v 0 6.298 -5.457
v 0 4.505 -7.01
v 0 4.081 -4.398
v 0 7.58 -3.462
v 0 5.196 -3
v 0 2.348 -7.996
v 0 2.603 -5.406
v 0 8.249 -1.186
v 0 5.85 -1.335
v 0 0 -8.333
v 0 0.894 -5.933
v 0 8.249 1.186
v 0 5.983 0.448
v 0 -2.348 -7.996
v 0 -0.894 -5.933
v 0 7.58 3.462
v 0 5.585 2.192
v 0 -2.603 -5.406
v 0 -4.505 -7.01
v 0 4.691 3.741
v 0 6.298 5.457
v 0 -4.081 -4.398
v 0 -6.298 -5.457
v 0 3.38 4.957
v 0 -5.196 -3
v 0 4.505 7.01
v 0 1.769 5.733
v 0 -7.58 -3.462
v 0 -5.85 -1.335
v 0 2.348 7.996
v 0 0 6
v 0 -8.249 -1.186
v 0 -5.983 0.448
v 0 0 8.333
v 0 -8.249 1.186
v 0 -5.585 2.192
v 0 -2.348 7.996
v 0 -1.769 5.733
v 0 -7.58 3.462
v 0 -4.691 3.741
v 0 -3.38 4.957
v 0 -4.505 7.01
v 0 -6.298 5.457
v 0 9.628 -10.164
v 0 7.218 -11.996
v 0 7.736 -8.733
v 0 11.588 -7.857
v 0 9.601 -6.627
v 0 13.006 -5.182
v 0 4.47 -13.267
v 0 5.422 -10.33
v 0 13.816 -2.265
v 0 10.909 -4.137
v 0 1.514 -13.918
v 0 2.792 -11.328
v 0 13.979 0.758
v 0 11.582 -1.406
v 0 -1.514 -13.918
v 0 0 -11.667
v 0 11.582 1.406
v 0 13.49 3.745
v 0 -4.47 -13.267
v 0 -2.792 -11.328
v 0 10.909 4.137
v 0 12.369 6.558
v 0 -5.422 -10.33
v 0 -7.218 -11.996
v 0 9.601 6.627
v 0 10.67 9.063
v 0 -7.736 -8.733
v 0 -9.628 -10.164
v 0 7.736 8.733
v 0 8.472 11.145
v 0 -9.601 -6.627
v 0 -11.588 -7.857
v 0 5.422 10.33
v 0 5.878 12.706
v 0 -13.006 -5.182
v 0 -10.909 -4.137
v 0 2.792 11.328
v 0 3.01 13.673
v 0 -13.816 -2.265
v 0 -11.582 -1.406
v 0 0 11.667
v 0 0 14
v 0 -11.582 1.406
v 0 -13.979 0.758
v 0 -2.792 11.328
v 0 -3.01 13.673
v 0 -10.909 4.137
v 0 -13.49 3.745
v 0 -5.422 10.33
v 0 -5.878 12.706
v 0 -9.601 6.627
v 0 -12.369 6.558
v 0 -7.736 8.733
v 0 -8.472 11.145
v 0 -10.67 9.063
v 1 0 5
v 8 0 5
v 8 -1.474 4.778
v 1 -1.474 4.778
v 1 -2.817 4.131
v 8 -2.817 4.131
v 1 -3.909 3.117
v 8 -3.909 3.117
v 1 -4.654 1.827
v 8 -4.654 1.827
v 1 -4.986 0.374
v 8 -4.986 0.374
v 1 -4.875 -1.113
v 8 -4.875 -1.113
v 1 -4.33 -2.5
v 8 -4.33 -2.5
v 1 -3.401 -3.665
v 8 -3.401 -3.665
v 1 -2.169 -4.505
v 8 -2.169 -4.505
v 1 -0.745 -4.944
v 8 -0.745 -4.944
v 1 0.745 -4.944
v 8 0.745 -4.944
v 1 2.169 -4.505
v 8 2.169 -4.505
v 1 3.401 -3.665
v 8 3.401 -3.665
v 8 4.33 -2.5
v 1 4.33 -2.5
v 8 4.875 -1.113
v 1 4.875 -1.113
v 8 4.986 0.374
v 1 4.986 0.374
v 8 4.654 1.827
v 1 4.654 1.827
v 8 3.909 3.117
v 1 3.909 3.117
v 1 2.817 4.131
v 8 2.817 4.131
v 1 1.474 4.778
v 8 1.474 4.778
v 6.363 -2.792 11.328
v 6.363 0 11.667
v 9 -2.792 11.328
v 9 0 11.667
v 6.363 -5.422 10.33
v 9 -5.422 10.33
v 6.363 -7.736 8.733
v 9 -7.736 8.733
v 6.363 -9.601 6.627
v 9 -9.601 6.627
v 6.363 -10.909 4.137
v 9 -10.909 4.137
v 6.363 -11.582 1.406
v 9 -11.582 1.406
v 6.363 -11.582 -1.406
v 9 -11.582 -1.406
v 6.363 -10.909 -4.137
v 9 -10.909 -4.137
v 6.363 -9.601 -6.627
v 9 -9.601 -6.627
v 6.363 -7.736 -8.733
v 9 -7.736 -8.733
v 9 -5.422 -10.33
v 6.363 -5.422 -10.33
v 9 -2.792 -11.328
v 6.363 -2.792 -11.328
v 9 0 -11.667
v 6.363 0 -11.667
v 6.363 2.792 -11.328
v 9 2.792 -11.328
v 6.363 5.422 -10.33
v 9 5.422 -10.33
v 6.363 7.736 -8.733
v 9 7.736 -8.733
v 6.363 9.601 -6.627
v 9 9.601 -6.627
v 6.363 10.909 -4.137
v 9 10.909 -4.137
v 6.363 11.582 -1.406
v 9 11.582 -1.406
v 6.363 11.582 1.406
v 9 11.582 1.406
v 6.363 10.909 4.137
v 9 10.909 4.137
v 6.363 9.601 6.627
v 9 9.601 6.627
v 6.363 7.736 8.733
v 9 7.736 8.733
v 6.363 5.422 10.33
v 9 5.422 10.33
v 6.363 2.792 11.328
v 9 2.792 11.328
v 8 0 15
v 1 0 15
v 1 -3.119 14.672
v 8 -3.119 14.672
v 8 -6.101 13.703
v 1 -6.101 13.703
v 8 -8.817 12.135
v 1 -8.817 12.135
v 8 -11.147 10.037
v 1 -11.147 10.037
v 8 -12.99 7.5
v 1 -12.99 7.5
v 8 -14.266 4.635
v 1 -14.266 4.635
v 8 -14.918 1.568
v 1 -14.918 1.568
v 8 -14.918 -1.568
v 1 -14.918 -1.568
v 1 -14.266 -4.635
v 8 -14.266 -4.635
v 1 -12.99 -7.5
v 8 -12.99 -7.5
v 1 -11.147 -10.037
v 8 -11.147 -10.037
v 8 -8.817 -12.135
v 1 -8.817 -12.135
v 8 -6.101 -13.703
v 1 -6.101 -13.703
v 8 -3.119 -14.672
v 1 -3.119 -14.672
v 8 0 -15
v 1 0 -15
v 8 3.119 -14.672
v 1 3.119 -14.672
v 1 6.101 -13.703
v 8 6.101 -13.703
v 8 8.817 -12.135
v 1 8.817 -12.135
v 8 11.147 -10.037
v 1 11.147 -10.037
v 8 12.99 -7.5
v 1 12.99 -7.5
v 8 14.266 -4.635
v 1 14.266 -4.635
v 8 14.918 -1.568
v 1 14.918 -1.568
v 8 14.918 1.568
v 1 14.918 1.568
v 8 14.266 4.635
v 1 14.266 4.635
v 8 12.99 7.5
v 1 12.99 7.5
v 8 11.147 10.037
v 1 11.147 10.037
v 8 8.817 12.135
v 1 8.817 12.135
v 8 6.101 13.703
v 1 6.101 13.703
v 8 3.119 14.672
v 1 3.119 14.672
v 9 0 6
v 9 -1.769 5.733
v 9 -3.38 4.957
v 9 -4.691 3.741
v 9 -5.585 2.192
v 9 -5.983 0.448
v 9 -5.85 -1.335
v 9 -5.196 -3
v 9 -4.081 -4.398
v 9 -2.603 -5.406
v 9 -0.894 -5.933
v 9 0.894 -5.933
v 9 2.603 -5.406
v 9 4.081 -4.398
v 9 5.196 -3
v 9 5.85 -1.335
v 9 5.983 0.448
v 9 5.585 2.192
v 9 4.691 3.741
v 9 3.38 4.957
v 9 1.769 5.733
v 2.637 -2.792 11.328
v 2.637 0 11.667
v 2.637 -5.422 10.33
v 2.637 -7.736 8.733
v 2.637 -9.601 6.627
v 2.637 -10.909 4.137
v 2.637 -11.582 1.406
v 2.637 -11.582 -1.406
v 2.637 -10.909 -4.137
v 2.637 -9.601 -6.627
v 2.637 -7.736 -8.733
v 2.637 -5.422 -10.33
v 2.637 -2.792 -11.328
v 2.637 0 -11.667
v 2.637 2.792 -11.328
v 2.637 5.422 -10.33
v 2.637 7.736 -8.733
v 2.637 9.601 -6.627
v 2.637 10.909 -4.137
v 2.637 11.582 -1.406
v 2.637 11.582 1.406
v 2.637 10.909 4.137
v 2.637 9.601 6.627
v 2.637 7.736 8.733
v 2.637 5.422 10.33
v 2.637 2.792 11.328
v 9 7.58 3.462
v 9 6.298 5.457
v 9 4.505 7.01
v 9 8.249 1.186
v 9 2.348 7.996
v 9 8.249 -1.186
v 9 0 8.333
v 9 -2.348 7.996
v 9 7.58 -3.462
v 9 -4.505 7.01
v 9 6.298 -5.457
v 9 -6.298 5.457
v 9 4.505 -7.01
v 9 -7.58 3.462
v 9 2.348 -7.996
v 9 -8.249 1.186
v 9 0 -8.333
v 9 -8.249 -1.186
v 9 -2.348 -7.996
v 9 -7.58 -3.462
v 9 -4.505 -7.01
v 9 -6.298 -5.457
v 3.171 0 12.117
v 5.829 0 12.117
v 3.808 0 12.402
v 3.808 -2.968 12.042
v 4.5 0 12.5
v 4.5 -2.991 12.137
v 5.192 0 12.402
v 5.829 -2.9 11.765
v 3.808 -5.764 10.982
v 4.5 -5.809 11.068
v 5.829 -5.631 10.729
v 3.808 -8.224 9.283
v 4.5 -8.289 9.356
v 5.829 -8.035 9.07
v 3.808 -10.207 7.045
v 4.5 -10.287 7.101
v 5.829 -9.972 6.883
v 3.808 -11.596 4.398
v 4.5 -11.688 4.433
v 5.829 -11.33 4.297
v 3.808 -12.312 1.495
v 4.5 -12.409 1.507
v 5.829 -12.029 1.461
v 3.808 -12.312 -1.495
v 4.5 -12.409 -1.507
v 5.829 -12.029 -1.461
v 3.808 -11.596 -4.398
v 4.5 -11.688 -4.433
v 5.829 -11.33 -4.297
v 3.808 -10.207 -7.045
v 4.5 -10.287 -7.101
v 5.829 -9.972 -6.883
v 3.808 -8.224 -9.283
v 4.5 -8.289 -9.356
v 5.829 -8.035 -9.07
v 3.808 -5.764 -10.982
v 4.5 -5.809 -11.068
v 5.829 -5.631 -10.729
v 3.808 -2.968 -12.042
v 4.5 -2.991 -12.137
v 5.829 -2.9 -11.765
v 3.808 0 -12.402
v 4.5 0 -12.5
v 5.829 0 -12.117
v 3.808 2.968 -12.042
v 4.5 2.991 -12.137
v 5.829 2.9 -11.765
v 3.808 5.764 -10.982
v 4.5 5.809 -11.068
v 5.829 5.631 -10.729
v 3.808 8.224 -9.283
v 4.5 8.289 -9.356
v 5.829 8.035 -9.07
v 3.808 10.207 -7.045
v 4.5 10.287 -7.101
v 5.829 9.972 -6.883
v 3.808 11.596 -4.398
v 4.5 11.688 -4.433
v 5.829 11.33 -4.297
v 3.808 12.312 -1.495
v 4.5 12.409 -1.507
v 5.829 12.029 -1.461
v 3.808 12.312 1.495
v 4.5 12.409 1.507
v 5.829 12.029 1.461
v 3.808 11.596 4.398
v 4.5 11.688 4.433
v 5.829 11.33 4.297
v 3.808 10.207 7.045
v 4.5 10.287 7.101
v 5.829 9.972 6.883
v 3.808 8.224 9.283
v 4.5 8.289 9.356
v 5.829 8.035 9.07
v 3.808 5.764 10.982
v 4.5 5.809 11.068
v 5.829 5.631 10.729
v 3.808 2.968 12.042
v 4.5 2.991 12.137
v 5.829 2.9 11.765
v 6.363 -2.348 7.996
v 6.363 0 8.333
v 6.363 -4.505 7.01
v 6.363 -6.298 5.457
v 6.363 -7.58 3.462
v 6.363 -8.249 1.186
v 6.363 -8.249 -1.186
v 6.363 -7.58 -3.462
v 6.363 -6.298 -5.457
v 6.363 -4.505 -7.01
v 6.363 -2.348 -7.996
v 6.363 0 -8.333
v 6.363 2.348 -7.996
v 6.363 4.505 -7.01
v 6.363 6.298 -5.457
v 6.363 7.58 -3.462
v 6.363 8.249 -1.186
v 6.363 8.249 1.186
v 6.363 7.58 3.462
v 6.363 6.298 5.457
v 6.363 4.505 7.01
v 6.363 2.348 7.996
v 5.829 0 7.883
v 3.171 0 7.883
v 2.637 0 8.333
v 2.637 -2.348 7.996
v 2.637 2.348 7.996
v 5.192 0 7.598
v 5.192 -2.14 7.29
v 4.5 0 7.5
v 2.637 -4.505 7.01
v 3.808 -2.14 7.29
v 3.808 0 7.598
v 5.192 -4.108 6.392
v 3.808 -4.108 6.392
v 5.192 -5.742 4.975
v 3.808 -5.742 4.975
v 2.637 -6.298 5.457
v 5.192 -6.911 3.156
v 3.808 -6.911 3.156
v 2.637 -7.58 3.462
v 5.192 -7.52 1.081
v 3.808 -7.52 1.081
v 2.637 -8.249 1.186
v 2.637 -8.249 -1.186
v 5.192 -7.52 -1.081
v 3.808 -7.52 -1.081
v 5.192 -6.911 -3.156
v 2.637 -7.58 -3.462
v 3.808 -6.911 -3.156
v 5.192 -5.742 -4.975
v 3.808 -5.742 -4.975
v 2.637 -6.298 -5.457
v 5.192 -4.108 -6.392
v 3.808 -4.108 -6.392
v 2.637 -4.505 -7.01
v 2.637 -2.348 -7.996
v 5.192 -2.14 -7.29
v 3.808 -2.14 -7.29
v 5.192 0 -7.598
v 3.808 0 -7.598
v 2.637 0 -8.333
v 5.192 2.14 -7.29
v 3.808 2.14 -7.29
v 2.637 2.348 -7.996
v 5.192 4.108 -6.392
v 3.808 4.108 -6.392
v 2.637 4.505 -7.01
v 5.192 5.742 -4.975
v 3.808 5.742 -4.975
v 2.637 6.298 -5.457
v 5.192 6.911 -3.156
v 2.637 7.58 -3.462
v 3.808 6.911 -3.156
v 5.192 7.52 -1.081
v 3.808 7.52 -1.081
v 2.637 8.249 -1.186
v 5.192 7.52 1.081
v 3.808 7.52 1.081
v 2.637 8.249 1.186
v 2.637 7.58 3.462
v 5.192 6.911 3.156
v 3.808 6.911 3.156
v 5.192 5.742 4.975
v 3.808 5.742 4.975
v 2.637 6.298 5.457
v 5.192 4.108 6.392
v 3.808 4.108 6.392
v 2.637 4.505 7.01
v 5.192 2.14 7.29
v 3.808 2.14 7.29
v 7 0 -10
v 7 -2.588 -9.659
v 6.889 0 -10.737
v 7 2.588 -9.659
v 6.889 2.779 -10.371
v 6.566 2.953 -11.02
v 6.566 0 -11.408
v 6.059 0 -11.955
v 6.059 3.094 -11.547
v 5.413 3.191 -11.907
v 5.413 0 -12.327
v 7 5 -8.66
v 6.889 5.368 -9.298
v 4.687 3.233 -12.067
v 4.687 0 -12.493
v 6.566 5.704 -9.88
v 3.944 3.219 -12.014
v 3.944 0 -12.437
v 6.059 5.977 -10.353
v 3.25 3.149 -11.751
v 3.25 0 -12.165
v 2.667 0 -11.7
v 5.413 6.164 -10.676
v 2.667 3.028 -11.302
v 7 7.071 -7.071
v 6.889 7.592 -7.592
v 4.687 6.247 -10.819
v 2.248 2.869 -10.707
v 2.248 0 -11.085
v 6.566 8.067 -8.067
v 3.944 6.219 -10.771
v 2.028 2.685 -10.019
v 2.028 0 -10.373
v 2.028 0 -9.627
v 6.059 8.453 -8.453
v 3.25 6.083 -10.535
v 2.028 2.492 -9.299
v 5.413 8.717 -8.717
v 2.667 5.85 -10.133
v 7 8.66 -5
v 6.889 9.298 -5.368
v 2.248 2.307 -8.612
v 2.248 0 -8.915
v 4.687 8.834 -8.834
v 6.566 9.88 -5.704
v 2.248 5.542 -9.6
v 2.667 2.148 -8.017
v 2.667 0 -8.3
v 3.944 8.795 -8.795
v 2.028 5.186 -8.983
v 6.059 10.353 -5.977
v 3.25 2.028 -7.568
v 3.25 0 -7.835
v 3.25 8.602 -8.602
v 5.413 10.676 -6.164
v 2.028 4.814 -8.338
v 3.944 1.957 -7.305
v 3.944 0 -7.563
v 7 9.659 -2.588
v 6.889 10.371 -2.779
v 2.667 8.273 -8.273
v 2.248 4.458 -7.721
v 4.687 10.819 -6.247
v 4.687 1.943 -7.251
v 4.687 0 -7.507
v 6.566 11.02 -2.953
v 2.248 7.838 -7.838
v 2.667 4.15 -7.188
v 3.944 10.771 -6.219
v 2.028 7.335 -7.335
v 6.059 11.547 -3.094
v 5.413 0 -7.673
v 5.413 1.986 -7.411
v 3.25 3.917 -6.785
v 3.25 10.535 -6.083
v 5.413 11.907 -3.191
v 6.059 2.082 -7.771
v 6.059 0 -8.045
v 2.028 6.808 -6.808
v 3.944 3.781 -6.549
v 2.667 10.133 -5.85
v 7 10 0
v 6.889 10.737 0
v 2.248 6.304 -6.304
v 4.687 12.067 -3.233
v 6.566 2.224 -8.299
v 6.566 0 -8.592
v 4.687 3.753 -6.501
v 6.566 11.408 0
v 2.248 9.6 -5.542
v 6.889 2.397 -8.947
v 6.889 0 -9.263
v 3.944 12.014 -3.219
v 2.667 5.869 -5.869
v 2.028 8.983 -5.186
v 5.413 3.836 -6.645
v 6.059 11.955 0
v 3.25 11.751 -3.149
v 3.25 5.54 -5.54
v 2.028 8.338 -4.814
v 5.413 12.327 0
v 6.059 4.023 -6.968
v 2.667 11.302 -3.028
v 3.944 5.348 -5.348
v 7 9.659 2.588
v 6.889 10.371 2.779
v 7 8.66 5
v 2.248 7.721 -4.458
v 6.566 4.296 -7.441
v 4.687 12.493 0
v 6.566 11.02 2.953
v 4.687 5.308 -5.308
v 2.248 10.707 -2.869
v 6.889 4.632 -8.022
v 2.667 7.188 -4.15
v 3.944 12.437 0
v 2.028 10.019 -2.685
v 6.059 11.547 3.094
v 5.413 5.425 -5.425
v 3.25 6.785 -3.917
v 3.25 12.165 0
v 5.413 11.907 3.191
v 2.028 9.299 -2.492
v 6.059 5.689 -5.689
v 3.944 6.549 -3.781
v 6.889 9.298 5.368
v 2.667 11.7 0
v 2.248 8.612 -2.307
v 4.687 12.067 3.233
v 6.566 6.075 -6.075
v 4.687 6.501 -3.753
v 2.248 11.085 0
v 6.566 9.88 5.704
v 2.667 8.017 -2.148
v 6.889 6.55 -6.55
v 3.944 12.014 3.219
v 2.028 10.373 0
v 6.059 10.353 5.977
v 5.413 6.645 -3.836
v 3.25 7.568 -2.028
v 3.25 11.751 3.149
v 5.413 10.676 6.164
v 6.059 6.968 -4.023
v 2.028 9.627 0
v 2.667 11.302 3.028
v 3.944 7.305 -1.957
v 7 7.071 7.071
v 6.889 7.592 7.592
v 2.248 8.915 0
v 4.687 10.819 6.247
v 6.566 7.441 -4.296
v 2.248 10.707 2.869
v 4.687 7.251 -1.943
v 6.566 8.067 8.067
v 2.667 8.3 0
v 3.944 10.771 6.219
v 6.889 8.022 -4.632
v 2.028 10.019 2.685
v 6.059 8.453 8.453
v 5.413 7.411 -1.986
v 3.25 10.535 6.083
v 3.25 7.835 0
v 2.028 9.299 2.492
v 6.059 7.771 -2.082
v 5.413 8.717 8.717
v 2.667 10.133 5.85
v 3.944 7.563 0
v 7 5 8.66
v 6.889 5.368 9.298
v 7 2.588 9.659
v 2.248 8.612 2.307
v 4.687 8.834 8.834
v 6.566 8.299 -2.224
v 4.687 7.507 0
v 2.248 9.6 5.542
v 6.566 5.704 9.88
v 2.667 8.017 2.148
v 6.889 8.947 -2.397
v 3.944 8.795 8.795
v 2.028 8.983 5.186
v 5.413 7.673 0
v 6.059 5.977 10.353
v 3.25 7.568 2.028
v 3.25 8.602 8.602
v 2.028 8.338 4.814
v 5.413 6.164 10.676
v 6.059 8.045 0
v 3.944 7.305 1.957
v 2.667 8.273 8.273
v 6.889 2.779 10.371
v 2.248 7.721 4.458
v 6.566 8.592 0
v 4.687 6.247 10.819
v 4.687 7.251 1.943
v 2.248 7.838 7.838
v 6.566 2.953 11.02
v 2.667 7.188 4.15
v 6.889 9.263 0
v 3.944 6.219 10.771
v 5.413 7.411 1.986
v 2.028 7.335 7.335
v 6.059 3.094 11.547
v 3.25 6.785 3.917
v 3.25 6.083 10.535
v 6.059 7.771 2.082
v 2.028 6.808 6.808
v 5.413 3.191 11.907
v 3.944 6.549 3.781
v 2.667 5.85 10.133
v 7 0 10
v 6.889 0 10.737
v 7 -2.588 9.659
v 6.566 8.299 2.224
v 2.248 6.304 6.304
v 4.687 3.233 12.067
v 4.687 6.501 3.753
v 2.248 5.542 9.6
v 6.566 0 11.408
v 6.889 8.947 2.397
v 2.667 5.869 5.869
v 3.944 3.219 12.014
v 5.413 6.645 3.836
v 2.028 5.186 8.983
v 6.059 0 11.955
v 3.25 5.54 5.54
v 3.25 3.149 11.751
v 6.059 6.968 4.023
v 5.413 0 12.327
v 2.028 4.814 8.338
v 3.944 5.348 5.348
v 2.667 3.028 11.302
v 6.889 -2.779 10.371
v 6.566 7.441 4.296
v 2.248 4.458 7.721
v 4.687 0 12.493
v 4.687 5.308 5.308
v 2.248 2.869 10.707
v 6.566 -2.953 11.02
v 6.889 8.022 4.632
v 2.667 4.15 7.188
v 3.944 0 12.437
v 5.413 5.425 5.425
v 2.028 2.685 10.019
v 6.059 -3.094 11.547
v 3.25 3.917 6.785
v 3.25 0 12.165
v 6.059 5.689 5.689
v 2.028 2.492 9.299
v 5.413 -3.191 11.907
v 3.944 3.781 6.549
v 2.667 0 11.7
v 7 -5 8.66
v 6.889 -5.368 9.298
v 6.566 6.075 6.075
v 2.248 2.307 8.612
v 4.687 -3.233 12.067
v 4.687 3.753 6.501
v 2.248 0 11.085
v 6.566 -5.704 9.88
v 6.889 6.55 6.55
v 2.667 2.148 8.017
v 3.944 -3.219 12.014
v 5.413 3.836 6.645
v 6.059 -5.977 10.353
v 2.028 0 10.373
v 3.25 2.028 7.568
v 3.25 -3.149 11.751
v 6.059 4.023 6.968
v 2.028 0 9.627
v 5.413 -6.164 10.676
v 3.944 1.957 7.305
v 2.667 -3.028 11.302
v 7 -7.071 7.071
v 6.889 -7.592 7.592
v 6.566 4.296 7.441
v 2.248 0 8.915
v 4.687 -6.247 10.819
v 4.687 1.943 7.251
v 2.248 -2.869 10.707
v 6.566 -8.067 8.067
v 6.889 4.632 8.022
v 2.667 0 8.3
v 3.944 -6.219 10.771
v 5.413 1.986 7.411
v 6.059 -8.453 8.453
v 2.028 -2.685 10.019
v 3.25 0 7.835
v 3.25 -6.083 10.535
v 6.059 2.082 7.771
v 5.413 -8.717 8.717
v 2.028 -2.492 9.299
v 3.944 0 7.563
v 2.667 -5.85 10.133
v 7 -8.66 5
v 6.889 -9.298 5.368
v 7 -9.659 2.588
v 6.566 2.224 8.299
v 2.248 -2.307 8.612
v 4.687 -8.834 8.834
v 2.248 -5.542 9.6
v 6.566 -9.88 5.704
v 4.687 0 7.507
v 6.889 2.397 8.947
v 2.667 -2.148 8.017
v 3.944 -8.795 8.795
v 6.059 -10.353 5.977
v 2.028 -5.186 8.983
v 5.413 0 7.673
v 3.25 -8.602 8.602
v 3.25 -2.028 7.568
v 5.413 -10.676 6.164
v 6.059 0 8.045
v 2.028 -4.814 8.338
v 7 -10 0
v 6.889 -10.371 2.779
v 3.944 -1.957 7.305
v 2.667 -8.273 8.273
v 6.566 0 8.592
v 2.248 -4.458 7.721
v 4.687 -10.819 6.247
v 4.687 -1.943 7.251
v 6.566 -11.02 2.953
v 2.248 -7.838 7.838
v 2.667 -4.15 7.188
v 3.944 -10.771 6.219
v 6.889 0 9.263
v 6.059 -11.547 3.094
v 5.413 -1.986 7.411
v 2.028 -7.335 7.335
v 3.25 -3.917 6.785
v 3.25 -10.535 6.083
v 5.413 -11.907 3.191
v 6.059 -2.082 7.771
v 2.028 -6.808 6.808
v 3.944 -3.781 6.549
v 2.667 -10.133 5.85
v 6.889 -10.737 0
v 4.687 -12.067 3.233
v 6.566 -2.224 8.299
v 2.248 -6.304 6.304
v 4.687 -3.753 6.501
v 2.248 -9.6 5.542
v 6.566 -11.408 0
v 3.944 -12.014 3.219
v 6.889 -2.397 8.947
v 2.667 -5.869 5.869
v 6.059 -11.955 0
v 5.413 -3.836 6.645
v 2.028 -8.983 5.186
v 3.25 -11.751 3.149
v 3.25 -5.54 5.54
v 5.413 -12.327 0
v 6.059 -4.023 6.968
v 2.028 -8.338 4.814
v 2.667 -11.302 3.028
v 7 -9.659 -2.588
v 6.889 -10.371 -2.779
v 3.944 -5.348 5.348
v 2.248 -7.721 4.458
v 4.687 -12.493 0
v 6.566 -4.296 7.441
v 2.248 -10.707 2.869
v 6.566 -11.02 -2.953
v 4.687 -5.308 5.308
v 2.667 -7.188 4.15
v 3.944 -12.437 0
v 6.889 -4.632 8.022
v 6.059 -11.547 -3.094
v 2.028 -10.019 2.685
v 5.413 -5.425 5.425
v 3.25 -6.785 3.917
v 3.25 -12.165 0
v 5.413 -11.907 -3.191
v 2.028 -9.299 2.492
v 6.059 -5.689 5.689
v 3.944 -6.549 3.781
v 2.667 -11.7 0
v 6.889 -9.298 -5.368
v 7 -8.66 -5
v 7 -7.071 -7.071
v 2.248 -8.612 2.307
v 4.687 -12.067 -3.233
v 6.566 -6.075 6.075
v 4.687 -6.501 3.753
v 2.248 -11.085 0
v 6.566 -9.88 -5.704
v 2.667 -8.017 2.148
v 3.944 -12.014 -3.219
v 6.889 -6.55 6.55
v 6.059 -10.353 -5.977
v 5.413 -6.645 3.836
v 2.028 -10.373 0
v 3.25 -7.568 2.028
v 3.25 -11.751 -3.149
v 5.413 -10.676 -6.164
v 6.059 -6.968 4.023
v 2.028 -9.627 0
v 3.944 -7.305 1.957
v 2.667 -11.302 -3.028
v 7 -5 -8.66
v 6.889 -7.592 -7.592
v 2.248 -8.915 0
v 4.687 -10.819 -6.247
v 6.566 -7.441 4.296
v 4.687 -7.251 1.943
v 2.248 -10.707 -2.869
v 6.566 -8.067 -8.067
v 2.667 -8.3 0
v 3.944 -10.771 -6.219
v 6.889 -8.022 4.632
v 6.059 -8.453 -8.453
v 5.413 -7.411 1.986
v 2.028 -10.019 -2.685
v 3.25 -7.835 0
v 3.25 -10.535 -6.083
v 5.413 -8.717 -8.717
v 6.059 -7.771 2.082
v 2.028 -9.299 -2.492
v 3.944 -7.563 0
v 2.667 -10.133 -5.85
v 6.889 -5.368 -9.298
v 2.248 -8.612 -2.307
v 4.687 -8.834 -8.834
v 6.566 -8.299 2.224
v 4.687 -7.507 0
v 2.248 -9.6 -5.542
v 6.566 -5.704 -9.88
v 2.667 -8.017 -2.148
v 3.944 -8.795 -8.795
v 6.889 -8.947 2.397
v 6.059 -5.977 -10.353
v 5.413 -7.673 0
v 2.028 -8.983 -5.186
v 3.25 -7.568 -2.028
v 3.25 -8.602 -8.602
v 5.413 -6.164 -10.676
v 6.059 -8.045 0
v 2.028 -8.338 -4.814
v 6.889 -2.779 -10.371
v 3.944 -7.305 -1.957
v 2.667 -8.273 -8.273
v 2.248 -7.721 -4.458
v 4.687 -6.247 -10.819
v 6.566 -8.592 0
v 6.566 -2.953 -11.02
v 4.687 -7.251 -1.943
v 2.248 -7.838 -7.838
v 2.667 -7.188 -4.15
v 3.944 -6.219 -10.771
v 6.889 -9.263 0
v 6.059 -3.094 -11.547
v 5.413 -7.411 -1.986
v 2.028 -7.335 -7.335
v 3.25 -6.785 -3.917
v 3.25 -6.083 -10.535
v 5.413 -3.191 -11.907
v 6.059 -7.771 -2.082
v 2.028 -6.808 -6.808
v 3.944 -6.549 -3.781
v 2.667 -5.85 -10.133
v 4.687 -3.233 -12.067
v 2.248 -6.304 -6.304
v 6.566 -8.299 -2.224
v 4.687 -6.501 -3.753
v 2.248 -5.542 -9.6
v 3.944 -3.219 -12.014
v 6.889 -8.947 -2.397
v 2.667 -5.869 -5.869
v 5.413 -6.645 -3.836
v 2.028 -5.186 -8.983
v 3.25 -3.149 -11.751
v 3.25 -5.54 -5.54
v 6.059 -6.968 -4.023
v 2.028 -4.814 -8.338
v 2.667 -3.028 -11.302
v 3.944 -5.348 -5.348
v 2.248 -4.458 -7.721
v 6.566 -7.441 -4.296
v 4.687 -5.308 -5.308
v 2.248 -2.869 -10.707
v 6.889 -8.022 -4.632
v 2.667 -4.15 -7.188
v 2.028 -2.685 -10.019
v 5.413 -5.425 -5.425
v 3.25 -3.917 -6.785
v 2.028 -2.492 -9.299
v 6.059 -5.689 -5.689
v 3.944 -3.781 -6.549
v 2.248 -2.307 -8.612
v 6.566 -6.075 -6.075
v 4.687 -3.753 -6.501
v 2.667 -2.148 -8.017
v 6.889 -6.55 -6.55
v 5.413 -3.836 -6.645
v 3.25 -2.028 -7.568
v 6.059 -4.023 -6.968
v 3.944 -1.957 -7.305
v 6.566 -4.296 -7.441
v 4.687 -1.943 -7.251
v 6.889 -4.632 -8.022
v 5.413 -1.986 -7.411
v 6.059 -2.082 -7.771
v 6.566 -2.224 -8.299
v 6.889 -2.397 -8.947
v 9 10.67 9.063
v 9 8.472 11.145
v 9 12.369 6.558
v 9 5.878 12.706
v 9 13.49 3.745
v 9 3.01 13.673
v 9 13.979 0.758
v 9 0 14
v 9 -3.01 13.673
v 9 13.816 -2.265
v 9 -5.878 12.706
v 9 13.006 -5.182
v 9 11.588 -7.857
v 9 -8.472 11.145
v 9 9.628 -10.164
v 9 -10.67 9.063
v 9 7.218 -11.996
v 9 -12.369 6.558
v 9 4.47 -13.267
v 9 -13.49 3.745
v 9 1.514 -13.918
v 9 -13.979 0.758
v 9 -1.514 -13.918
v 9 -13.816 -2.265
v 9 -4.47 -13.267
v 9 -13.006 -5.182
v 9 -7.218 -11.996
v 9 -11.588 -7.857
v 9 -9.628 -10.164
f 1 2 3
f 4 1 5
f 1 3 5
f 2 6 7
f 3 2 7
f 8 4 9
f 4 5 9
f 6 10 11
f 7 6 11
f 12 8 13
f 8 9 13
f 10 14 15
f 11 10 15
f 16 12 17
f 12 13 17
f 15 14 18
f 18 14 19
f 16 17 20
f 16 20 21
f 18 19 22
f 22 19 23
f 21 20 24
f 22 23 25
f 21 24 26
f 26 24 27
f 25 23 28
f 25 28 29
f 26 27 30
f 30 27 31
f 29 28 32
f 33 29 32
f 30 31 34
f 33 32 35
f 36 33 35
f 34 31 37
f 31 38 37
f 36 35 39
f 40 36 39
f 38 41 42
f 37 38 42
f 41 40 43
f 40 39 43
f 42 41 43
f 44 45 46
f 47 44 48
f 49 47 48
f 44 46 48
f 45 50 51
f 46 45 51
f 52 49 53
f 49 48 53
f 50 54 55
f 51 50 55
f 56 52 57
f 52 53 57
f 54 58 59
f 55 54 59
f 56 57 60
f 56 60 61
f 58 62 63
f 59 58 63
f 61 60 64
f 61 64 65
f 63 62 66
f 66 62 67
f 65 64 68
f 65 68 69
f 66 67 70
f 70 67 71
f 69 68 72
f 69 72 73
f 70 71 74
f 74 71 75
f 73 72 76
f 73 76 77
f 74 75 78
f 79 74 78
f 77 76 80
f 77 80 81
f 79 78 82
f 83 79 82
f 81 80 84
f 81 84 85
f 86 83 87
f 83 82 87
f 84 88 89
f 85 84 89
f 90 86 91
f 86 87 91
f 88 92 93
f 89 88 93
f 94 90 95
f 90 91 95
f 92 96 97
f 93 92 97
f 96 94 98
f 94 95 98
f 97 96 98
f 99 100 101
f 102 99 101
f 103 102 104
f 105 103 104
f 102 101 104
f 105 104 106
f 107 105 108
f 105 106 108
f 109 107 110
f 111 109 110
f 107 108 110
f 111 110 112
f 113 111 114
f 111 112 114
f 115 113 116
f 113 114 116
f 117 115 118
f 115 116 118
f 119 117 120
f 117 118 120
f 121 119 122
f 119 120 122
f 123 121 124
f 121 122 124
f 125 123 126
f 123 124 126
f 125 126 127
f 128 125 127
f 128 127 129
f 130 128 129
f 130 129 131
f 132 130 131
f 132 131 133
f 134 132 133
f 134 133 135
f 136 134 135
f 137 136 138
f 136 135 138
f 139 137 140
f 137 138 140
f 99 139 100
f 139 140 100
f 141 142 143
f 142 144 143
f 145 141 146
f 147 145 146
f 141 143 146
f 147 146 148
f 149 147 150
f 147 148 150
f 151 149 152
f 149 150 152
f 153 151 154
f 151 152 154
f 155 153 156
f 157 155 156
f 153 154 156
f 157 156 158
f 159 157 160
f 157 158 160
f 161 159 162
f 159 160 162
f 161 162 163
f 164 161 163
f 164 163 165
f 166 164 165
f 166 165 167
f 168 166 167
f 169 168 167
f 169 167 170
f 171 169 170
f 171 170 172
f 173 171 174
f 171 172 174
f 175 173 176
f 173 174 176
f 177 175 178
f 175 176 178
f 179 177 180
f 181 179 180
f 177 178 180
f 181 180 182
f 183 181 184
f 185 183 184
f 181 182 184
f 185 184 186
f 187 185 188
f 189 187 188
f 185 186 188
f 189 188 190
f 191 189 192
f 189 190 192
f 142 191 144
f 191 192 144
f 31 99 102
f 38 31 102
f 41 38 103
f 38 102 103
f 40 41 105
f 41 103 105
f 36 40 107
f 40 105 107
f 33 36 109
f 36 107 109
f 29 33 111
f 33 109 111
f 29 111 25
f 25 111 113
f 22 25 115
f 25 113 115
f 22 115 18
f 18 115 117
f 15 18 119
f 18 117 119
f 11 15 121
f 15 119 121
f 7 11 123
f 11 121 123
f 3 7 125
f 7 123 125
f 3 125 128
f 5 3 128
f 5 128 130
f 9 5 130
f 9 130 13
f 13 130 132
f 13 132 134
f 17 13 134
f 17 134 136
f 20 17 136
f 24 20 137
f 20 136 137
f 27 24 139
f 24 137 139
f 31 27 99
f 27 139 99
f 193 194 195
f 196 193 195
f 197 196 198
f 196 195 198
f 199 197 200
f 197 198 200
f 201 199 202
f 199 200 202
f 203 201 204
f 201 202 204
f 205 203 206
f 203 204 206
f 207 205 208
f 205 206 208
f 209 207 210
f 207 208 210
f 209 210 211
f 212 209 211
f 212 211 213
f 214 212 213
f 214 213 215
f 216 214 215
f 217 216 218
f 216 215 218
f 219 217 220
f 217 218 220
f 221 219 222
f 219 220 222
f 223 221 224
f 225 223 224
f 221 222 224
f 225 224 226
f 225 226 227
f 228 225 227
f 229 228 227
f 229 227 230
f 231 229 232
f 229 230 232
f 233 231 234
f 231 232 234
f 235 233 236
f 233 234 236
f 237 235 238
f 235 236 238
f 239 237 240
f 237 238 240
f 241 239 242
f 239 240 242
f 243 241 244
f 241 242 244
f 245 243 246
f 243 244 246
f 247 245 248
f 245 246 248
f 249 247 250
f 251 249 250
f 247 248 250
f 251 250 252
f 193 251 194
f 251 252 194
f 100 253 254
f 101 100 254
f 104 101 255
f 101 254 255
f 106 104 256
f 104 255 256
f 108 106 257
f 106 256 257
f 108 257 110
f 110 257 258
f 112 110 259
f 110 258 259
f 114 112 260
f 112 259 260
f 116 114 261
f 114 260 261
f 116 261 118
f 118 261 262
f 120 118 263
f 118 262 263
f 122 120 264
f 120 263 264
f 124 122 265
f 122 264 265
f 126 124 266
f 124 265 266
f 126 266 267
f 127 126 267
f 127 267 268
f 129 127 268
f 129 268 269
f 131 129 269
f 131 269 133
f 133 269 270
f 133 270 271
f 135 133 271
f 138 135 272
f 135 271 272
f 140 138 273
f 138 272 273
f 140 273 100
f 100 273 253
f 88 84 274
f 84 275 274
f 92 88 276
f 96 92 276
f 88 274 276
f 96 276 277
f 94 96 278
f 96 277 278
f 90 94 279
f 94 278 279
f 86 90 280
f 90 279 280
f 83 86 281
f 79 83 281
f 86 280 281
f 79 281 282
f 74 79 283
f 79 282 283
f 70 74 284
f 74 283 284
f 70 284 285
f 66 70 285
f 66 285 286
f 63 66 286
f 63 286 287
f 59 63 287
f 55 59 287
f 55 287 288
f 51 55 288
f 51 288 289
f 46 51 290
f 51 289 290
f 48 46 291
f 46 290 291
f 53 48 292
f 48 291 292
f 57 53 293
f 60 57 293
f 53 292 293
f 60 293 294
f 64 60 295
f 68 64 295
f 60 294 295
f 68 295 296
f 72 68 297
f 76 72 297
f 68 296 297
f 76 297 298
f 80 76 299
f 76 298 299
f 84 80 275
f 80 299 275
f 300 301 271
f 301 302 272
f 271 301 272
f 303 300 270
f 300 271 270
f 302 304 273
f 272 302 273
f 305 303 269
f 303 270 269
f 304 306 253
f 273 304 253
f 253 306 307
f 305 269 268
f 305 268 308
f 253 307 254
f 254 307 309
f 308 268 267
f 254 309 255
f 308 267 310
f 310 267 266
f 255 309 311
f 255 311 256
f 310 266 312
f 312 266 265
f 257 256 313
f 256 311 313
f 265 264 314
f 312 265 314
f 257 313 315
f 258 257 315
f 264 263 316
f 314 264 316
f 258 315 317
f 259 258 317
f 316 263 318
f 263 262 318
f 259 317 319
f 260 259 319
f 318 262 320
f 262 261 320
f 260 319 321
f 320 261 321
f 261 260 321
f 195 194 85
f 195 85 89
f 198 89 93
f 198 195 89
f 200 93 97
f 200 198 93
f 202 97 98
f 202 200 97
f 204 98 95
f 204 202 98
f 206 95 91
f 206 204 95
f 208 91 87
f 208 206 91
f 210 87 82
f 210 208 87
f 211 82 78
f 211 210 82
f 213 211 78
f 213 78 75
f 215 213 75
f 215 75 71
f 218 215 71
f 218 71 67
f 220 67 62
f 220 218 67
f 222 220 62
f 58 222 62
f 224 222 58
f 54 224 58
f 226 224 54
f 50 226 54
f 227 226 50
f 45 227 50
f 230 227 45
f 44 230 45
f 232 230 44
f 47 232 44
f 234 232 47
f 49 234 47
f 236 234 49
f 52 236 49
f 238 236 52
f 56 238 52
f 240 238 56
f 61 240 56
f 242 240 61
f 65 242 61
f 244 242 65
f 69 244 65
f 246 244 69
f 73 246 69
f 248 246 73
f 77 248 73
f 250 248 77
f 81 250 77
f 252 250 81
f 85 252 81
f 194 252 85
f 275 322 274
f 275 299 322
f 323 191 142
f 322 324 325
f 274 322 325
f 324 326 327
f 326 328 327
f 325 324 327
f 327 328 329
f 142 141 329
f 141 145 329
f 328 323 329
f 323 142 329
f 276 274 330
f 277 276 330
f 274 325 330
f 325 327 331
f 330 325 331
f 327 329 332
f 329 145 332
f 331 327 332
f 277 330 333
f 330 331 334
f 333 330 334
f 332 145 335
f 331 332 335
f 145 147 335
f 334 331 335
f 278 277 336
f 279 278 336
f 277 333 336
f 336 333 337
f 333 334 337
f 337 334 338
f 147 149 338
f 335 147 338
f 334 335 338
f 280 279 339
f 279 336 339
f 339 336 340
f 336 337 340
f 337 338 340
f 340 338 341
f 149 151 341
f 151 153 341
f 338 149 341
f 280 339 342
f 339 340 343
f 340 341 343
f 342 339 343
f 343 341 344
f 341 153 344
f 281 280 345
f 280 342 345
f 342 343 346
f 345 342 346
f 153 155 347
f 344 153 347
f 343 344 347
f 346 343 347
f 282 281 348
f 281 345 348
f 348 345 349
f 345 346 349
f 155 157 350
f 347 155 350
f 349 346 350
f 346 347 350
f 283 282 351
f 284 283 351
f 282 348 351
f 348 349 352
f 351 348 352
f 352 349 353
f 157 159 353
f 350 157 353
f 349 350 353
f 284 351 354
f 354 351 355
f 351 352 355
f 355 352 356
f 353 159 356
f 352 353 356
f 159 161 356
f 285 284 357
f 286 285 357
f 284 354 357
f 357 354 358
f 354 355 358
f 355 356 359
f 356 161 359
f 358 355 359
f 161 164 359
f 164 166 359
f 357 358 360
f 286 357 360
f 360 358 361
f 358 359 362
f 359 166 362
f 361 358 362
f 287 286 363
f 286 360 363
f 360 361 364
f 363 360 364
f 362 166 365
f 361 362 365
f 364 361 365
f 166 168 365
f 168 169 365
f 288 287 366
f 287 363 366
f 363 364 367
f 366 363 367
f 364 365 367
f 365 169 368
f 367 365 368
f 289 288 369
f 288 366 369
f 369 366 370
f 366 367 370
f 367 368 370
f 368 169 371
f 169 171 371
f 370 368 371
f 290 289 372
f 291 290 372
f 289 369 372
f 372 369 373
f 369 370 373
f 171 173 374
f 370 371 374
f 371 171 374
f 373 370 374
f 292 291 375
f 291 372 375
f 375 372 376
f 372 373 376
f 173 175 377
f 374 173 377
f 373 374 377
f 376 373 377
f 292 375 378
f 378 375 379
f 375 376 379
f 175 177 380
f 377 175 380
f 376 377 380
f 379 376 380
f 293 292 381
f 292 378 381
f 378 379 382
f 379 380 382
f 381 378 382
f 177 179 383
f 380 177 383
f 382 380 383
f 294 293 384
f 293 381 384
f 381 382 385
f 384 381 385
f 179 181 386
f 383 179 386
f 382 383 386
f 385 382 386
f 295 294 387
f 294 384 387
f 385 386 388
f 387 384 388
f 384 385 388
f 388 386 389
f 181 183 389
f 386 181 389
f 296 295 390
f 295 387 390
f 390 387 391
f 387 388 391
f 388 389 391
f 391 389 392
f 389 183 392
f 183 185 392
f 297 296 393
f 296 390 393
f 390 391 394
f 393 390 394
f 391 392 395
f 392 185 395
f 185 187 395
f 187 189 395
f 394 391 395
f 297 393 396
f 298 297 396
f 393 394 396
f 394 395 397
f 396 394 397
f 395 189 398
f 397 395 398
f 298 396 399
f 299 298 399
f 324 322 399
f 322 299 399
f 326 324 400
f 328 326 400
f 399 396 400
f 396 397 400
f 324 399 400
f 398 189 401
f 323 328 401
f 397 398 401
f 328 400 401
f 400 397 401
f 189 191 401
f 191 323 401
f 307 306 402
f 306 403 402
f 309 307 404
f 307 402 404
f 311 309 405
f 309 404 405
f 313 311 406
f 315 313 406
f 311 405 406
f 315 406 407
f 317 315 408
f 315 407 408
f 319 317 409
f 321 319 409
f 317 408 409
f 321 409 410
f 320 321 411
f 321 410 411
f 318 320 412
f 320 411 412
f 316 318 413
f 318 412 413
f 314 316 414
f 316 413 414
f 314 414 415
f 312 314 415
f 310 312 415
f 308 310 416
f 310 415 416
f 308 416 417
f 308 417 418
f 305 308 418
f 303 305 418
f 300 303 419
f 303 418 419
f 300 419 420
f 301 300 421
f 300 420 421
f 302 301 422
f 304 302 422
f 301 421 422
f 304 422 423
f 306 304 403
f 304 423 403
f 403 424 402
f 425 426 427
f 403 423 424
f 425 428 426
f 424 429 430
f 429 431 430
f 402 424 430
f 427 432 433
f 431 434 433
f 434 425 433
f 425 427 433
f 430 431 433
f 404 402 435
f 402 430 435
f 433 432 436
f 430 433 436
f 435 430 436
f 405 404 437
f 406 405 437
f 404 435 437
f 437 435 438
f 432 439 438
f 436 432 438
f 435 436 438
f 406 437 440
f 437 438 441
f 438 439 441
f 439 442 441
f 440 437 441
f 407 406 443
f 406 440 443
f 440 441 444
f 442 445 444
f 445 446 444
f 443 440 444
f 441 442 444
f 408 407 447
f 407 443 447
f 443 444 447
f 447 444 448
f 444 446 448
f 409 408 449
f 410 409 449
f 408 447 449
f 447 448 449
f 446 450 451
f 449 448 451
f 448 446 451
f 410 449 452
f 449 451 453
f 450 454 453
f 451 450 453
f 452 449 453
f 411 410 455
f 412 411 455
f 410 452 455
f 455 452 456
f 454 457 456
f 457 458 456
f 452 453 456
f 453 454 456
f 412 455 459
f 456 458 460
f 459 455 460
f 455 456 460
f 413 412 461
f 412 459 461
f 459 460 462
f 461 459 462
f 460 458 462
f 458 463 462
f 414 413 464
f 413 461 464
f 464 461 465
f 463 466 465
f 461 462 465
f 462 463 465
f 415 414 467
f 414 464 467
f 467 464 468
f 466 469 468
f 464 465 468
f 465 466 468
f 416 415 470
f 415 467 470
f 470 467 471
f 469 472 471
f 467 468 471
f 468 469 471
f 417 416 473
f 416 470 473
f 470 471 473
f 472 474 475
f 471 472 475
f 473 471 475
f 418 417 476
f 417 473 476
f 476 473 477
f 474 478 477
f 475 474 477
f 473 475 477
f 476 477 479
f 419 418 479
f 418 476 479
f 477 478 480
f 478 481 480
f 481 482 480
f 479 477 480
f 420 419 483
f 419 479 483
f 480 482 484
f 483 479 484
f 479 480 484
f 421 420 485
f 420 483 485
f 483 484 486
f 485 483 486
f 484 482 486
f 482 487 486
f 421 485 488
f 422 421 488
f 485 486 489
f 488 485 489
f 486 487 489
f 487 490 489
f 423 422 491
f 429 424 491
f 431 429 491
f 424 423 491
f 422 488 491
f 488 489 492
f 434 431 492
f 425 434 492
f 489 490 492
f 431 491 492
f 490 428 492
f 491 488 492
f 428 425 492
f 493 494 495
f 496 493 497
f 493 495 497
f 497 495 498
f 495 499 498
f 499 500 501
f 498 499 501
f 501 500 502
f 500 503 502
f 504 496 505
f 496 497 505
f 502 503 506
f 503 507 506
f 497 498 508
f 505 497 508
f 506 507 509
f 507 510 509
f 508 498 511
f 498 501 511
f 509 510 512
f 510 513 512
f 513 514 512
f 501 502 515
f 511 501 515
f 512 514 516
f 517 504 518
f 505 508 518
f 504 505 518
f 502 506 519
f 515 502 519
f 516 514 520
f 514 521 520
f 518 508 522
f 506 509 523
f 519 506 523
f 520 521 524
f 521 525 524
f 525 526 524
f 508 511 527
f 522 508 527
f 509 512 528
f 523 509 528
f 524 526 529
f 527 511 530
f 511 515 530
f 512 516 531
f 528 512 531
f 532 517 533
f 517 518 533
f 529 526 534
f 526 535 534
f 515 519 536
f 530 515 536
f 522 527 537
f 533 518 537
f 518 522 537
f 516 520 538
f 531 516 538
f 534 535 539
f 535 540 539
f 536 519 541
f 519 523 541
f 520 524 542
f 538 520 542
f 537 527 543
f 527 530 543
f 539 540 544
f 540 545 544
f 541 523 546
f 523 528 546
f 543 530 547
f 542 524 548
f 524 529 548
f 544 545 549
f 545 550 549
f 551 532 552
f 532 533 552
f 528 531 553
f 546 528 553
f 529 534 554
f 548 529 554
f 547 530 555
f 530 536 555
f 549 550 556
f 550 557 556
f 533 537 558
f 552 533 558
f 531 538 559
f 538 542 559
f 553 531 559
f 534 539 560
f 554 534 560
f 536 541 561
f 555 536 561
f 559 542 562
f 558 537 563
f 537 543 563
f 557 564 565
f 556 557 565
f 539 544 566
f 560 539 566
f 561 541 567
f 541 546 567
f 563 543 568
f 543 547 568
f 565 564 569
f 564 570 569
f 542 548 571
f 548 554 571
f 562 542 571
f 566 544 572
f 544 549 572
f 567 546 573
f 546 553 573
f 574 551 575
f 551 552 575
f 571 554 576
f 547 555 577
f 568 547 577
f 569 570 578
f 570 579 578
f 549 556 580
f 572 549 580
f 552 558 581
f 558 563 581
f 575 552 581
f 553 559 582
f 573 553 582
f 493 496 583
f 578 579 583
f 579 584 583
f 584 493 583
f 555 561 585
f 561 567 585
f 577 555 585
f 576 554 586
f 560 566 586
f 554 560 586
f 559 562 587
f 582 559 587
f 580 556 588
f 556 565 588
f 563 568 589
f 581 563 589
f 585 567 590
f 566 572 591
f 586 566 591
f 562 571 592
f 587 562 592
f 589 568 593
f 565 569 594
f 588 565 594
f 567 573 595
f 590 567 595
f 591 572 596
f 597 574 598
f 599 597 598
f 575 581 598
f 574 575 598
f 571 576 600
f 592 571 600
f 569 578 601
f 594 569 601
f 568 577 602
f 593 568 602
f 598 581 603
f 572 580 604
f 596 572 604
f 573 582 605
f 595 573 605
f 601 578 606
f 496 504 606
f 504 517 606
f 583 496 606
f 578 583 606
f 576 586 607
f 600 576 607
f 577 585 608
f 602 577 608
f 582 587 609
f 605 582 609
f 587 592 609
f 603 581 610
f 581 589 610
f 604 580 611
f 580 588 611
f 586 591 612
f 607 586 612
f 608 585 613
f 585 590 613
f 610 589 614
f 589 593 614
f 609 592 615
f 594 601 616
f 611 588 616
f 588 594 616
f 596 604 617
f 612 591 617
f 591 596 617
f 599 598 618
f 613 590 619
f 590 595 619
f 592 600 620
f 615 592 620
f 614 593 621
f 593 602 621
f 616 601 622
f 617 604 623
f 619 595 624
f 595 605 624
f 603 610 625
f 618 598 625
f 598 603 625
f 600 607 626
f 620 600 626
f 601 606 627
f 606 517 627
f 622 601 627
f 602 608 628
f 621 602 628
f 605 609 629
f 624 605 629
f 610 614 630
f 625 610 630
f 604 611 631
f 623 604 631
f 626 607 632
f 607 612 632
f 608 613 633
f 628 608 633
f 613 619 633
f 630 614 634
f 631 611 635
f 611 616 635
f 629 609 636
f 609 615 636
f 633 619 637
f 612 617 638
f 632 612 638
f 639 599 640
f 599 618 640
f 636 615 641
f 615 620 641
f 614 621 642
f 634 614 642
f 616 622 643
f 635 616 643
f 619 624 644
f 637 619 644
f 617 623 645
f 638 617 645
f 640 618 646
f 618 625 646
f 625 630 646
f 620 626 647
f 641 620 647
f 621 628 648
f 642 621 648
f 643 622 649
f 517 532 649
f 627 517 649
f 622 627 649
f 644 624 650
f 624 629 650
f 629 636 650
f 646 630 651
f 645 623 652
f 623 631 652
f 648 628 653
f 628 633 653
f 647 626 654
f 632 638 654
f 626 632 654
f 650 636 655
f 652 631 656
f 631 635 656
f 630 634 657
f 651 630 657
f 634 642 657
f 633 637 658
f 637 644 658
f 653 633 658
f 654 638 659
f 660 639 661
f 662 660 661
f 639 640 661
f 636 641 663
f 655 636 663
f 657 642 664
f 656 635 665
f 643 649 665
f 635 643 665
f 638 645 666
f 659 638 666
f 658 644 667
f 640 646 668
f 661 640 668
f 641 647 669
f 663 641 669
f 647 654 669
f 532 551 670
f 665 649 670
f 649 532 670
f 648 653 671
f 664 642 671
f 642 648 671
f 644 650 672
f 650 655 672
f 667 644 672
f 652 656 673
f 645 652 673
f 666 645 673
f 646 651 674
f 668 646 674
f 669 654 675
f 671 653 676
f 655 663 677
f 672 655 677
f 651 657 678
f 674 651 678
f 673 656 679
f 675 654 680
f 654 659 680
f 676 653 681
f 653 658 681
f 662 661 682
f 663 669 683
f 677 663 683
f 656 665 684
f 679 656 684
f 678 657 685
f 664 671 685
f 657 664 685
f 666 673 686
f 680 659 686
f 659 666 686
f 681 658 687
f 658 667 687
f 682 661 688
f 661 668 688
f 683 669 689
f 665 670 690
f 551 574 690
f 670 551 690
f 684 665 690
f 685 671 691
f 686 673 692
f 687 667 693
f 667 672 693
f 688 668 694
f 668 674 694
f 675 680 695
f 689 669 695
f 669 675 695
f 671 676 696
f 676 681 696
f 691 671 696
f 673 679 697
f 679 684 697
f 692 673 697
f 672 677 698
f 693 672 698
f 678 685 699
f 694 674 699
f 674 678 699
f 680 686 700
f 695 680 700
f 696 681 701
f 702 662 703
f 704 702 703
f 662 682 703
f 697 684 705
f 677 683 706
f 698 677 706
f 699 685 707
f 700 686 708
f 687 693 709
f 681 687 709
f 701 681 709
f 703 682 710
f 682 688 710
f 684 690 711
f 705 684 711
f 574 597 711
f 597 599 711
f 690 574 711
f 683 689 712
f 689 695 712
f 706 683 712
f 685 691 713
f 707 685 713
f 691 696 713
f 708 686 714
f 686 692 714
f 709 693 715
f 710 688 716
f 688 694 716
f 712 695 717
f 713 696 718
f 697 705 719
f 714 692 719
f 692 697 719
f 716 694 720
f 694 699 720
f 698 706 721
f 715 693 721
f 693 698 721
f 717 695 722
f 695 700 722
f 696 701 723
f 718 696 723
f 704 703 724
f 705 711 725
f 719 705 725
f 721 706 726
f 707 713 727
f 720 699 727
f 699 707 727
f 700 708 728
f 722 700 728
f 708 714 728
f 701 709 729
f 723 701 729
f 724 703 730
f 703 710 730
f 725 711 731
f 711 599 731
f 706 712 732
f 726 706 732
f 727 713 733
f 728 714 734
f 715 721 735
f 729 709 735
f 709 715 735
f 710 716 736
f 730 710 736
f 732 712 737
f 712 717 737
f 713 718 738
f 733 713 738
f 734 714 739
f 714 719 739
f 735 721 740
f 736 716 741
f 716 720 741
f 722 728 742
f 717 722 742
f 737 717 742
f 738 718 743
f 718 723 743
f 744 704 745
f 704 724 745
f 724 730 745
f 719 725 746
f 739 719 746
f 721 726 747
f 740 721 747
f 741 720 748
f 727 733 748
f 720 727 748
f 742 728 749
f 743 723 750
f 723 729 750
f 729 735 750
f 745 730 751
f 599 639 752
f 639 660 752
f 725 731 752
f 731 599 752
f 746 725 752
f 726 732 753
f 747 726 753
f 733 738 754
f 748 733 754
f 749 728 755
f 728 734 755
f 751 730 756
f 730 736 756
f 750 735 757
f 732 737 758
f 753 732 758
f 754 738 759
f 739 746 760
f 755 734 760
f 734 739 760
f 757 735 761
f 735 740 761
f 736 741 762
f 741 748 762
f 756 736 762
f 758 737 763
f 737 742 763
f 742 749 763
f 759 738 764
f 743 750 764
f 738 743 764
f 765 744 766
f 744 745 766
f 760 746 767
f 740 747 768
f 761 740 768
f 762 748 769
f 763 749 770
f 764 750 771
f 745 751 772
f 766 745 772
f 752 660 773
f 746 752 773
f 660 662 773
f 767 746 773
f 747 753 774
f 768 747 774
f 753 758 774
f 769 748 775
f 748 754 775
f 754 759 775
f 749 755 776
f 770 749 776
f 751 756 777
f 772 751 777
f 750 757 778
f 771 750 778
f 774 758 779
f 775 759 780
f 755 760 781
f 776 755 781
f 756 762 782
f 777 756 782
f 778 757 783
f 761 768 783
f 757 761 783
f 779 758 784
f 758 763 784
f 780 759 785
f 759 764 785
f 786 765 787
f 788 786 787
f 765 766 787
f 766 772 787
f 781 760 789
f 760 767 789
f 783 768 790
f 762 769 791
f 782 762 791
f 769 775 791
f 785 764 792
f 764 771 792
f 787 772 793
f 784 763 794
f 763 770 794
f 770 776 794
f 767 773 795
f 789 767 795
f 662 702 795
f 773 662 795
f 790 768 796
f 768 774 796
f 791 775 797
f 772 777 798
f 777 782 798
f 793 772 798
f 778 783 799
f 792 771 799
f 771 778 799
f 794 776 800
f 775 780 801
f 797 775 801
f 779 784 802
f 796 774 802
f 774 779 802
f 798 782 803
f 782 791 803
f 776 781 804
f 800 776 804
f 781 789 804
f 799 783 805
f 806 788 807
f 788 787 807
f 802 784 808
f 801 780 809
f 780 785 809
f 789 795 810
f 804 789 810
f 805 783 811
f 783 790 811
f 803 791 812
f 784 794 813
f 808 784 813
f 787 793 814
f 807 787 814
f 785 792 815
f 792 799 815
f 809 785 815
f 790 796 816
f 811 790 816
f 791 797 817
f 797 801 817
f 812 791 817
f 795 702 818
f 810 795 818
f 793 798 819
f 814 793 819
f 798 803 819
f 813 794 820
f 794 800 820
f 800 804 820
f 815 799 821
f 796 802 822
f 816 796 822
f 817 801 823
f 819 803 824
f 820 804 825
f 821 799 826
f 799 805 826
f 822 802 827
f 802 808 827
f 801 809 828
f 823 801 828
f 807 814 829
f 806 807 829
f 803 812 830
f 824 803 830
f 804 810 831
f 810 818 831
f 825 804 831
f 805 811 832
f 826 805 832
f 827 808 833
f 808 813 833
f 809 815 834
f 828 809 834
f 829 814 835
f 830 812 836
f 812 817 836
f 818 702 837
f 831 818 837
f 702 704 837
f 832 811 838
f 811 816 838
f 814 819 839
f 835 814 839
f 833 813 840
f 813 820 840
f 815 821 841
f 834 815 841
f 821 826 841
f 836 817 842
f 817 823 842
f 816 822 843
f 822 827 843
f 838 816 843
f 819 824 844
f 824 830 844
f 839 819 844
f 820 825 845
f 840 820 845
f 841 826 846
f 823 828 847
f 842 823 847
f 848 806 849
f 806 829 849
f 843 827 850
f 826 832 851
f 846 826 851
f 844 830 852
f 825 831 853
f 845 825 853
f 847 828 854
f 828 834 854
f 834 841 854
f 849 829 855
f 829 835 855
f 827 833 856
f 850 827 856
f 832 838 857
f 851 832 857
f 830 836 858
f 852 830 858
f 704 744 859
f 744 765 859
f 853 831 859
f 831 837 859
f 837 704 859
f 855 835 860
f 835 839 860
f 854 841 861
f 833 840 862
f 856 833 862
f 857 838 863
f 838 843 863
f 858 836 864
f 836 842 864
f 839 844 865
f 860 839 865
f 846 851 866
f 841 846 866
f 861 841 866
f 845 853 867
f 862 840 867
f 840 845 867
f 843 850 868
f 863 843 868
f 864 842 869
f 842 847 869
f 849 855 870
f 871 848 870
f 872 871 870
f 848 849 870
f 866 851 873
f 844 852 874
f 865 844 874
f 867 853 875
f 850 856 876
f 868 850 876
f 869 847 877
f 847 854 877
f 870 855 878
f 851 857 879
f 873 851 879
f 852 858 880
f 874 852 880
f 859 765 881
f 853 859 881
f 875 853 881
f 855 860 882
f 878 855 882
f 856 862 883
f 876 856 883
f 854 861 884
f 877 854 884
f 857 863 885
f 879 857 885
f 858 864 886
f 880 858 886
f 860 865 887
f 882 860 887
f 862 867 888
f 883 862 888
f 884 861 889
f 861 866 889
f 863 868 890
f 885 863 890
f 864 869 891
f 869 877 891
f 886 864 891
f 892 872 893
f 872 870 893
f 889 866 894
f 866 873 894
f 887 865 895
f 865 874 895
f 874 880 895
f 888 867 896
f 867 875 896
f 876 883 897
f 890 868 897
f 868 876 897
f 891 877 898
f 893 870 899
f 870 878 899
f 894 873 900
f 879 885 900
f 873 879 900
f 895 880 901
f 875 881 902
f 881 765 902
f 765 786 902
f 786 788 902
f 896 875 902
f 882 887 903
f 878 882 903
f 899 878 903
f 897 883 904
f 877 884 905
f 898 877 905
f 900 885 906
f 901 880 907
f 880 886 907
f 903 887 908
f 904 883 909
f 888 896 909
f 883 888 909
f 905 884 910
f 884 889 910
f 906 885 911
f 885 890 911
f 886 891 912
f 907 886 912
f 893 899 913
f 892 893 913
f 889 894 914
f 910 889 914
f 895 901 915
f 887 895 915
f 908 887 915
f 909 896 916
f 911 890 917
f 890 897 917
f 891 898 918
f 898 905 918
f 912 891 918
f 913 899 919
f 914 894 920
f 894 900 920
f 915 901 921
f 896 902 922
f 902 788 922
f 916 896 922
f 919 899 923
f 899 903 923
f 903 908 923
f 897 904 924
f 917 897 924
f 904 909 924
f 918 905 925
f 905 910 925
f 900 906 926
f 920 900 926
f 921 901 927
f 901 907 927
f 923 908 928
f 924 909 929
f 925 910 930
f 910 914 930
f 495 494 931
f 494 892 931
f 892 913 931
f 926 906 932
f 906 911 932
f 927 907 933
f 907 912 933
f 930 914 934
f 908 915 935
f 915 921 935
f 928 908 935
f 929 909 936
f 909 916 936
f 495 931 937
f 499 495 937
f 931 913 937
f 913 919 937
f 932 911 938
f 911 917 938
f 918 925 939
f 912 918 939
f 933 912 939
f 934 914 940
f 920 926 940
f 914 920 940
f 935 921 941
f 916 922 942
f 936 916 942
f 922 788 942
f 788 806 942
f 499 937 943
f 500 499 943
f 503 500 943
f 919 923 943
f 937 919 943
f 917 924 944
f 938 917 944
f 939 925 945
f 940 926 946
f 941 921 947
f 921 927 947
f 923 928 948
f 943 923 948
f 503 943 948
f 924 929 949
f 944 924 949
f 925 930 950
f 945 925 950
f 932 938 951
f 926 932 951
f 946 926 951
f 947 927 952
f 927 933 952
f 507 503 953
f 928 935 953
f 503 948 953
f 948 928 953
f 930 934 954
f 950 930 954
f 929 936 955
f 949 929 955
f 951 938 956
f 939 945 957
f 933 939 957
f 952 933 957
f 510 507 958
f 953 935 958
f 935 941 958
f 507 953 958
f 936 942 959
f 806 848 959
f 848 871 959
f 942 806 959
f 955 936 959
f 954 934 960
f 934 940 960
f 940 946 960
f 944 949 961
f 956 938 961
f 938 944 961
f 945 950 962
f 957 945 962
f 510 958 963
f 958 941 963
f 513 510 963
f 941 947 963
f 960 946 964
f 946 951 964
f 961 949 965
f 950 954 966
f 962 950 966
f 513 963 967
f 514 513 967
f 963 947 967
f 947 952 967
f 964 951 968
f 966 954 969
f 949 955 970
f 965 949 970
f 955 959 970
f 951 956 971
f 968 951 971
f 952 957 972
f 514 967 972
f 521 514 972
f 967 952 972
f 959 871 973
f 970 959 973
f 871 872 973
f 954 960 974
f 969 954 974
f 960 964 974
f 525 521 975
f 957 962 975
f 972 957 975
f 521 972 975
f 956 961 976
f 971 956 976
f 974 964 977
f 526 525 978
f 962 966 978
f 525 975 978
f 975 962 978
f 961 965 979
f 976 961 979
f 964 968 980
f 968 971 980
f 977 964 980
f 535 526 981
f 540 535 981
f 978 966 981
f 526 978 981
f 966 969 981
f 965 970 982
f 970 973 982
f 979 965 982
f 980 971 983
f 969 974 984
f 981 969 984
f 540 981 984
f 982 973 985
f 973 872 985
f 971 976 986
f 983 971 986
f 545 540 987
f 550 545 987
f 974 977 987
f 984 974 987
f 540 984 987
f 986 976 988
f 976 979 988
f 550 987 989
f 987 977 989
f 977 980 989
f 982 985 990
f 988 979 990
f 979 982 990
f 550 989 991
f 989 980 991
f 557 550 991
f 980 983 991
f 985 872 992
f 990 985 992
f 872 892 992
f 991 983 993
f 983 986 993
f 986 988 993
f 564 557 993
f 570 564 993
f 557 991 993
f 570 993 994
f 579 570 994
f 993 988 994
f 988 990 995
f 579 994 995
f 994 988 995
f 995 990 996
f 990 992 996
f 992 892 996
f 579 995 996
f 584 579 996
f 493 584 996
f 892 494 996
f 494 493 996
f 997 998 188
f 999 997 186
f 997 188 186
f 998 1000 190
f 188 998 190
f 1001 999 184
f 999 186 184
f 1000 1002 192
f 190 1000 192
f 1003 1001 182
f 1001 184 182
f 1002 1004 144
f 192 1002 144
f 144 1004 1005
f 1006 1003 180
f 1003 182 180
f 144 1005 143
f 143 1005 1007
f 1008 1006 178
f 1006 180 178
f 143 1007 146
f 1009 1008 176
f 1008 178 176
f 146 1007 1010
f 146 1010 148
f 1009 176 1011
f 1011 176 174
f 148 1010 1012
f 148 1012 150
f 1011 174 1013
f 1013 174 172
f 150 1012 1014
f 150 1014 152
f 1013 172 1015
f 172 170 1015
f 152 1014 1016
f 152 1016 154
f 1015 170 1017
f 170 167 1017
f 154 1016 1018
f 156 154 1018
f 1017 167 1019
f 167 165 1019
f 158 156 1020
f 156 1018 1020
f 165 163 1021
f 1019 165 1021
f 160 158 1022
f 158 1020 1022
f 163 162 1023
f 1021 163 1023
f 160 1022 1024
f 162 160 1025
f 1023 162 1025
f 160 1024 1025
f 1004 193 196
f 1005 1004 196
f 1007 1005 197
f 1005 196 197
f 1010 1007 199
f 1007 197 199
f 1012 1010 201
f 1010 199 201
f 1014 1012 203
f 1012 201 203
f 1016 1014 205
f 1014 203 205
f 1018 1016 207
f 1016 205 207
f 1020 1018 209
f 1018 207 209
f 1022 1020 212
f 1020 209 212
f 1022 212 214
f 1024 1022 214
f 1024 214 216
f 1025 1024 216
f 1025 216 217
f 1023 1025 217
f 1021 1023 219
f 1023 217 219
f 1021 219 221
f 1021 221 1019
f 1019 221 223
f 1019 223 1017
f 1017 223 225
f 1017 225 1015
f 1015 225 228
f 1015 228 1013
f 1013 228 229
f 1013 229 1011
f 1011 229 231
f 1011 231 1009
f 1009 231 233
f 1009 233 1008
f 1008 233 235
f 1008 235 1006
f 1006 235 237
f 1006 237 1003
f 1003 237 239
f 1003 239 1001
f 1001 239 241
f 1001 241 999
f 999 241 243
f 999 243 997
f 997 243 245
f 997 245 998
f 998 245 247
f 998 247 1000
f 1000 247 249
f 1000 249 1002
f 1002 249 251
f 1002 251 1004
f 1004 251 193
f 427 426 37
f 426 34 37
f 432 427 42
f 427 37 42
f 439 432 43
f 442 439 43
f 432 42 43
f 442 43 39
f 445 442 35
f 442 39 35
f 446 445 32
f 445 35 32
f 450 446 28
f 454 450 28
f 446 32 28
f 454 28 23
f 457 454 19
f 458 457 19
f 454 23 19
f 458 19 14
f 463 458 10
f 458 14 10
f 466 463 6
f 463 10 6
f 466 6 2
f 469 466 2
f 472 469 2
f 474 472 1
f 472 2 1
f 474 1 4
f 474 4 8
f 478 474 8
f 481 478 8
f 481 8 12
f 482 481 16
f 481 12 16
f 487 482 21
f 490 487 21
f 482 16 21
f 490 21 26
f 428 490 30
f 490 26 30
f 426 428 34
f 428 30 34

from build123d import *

# Parameters (mm, degrees)
SKETCH_1_5_R   = 2.5
CHAMFER_1_SIZE = 1
CHAMFER_3_SIZE = 1


with BuildPart() as part:
    # Эскиз1 → Повернуть1 (revolve)
    with BuildSketch(Plane.XY, mode=Mode.PRIVATE) as revolve_1_sk:
        with BuildLine():
            Line((0, 8.333333333), (0, 5))
            Line((0, 5), (9, 5))
            Line((9, 5), (9, 8.333333333))
            Line((9, 8.333333333), (6.363389981, 8.333333333))
            ThreePointArc((6.363389981, 8.333333333), (4.5, 7.5), (2.636610019, 8.333333333))
            Line((2.636610019, 8.333333333), (0, 8.333333333))
        make_face()
    revolve(revolve_1_sk.sketch.rotate(Axis((0, 0, 0), (1, 0, 0)), 90), axis=Axis((0, 0, 0), (1, 0, 0)))

    # Фаска1
    chamfer_1_edges = [part.edges().sort_by_distance(p)[0] for p in [
        (9, 0, -5),
        (0, 0, -5),
    ]]
    chamfer(chamfer_1_edges, length=CHAMFER_1_SIZE)


with BuildPart() as body_2:
    # Эскиз1<4> → Повернуть2 (revolve)
    with BuildSketch(Plane.XY, mode=Mode.PRIVATE) as revolve_2_sk:
        with BuildLine():
            Line((0, 15), (0, 11.666666667))
            Line((0, 11.666666667), (2.636610019, 11.666666667))
            ThreePointArc((2.636610019, 11.666666667), (4.5, 12.5), (6.363389981, 11.666666667))
            Line((6.363389981, 11.666666667), (9, 11.666666667))
            Line((9, 11.666666667), (9, 15))
            Line((9, 15), (0, 15))
        make_face()
    revolve(revolve_2_sk.sketch.rotate(Axis((0, 0, 0), (1, 0, 0)), 90), axis=Axis((0, 0, 0), (1, 0, 0)))

    # Фаска3
    chamfer_3_edges = [body_2.edges().sort_by_distance(p)[0] for p in [
        (0, 0, -15),
        (9, 0, -15),
    ]]
    chamfer(chamfer_3_edges, length=CHAMFER_3_SIZE)


with BuildPart() as body_3:
    # Эскиз1<5> → Повернуть3 (revolve)
    with BuildSketch(Plane.XY, mode=Mode.PRIVATE) as revolve_3_sk:
        with Locations((4.5, 10)):
            Circle(SKETCH_1_5_R)
    revolve(revolve_3_sk.sketch.rotate(Axis((0, 0, 0), (1, 0, 0)), 270), axis=Axis((0, 0, 0), (1, 0, 0)))


solid = Compound([part.part, body_2.part, body_3.part])
